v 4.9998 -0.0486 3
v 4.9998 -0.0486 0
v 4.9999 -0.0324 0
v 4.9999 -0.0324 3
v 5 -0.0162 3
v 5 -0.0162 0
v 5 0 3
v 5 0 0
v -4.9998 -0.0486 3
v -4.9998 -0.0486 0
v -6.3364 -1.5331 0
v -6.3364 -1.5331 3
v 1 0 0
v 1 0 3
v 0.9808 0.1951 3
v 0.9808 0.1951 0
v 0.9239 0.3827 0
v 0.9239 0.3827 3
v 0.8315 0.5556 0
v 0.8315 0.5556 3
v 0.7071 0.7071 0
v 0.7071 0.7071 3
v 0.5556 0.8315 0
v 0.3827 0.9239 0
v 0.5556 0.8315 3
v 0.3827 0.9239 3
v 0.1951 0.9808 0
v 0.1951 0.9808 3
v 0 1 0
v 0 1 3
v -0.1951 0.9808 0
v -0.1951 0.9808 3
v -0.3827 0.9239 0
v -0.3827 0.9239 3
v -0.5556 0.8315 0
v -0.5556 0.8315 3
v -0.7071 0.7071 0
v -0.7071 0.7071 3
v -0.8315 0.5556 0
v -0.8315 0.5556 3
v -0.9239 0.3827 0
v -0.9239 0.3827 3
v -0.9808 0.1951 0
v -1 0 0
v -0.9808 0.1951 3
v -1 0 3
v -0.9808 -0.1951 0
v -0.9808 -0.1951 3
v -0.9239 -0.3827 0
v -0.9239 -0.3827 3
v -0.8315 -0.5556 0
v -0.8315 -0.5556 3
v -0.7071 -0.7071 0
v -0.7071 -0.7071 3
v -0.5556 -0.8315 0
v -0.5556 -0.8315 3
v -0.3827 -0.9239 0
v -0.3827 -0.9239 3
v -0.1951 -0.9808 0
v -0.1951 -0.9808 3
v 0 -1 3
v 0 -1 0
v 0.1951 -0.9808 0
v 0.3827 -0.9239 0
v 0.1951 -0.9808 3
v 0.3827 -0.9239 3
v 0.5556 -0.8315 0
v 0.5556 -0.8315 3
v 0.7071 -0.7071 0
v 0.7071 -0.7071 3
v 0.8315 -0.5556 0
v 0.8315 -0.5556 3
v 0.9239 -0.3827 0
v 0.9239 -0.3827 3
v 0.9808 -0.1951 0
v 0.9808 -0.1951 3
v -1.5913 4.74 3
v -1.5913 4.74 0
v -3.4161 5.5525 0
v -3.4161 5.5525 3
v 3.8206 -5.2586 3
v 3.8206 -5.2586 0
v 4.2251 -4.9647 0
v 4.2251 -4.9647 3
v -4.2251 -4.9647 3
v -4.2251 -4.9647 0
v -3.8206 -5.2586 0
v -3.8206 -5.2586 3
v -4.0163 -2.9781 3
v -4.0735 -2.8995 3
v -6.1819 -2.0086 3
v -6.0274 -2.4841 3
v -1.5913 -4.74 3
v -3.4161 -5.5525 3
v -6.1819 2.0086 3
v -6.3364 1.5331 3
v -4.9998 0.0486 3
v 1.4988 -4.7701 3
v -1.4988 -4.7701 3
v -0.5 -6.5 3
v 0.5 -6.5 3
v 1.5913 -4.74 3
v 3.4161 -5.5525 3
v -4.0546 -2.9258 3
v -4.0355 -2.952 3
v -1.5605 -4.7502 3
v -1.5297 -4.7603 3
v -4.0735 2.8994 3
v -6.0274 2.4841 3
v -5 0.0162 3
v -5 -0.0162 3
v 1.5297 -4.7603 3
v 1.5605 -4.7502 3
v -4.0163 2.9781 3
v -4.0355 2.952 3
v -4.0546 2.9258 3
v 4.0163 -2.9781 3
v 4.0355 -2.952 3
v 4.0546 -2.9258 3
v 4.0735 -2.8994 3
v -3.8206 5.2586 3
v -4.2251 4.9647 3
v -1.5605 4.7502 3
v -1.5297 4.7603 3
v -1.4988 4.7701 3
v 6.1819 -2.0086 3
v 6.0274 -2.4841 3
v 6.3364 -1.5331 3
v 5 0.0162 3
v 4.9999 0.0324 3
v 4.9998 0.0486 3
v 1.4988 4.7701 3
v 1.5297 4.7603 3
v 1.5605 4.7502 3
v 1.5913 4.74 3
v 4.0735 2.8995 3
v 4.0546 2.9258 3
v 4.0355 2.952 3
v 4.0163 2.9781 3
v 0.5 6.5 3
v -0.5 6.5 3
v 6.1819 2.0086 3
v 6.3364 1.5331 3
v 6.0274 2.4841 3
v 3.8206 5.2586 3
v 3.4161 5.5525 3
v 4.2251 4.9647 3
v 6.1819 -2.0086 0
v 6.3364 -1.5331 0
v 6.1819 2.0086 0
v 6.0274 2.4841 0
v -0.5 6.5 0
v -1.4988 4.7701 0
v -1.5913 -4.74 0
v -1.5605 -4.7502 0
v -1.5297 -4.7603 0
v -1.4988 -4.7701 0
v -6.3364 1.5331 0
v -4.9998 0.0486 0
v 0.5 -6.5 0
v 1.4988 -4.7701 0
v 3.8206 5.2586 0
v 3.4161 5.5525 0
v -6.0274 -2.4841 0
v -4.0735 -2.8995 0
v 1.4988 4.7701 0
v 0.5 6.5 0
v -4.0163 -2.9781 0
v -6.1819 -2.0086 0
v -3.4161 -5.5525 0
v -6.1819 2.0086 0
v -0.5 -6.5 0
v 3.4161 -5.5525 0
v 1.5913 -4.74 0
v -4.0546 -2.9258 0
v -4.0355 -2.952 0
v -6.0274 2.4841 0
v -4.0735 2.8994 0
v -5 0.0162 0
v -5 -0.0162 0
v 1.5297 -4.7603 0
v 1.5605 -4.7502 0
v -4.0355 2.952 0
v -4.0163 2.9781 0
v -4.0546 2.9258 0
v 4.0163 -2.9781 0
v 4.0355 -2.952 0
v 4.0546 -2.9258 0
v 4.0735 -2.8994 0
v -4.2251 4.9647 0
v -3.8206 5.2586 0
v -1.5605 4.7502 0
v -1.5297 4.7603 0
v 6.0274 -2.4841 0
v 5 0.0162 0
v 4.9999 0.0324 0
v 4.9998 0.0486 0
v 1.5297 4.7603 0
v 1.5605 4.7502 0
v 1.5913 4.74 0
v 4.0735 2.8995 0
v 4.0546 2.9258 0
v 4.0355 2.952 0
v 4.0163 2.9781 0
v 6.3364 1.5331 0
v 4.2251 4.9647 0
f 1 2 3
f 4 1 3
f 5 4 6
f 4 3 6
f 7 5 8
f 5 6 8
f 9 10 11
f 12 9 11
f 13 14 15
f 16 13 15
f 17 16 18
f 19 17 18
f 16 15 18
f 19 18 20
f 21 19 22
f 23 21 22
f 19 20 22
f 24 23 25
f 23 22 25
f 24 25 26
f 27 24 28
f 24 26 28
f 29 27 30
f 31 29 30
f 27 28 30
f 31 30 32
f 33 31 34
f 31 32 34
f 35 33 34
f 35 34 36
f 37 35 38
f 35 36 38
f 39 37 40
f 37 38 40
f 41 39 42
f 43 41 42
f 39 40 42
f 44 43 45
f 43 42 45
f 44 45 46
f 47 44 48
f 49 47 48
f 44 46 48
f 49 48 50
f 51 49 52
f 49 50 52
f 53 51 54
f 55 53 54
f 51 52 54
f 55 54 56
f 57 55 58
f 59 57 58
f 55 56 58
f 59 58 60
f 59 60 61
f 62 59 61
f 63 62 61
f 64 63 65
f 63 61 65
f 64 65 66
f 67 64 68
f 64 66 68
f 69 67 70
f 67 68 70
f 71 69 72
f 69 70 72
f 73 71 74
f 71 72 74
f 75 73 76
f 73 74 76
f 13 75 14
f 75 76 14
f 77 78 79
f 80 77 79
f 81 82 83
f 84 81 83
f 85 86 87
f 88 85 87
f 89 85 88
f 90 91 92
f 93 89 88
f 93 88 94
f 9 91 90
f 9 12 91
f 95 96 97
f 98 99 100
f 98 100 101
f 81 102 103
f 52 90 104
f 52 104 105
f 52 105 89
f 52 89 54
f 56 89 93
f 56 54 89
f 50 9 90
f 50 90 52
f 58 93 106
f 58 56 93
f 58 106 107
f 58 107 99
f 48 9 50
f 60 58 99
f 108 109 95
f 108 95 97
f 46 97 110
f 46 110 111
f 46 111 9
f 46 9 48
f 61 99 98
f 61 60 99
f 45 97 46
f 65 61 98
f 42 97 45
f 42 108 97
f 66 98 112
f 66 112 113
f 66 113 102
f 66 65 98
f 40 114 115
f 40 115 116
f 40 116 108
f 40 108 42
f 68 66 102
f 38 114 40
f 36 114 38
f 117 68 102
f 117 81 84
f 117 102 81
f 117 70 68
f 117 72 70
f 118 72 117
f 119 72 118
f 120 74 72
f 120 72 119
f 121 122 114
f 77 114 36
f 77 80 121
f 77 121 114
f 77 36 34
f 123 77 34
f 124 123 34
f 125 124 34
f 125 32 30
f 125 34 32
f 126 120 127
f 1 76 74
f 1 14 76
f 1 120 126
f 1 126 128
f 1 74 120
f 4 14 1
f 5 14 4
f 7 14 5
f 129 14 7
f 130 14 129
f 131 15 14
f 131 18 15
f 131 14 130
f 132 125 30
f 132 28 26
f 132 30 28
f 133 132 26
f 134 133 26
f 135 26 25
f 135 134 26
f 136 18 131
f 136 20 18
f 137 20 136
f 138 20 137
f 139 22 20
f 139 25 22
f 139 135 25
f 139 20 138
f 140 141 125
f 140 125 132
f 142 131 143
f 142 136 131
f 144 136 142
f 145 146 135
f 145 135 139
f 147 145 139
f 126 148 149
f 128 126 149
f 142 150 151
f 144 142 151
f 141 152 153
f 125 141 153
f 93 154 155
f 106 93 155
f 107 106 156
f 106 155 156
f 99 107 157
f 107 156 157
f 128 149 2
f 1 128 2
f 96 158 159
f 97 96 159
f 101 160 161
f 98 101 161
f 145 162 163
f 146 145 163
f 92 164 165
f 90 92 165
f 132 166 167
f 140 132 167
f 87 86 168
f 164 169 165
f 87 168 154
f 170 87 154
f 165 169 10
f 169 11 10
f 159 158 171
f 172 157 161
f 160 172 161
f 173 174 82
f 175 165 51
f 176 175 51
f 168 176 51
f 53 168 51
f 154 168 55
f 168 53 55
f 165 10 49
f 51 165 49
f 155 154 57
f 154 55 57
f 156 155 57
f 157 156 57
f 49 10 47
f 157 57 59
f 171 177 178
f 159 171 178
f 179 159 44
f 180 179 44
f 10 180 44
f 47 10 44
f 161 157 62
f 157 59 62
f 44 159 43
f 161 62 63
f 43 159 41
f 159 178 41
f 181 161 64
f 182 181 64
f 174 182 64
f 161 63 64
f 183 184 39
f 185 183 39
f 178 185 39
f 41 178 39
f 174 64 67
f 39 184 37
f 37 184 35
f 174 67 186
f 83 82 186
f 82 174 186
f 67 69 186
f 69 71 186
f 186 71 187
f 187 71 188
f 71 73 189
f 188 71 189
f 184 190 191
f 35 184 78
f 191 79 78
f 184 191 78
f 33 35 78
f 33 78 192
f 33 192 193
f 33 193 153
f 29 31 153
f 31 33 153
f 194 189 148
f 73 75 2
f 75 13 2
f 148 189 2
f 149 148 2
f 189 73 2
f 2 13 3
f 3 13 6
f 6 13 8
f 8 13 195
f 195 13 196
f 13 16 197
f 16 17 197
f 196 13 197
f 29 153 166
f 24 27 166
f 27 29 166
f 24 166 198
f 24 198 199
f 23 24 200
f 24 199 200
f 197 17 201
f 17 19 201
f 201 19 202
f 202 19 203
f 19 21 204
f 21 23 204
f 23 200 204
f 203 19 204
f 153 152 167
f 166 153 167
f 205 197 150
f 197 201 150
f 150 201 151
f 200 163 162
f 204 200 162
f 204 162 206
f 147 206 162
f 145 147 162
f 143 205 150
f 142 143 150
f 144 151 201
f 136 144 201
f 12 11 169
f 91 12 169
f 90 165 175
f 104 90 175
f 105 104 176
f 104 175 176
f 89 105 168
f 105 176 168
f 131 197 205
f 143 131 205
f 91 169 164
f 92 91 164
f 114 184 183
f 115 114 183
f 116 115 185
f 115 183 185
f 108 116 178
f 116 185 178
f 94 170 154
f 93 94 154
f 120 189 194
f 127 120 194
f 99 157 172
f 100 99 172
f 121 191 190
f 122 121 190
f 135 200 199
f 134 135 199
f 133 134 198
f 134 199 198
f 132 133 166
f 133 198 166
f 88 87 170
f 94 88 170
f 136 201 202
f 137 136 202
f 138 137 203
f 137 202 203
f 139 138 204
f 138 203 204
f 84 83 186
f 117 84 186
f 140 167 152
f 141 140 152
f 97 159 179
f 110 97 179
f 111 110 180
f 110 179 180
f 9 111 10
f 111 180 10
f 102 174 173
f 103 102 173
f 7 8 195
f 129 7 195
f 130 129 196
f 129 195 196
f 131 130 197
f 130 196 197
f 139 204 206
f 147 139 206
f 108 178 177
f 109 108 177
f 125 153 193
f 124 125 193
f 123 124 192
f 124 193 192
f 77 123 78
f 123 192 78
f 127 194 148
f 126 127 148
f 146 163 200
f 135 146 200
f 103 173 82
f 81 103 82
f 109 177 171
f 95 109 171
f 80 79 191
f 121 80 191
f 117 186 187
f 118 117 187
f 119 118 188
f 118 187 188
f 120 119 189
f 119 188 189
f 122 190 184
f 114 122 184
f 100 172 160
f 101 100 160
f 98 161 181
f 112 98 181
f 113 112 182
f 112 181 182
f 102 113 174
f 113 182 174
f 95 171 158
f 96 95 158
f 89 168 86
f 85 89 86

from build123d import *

# Parameters (mm, degrees)
F1_DEPTH = 3
F2_R     = 1
F3_DEPTH = 3


with BuildPart() as f1:
    # F0 (on Top) → F1 (new body)
    with BuildSketch(Plane.XY):
        with BuildLine():
            ThreePointArc((4.999764, -0.048624), (4.999941, -0.024312), (5, 0))
            ThreePointArc((5, 0), (4.999941, 0.024312), (4.999764, 0.048624))
            ThreePointArc((4.999764, 0.048624), (4.755283, 1.545085), (4.073474, 2.89945))
            ThreePointArc((4.073474, 2.89945), (4.045085, 2.938926), (4.016313, 2.978125))
            ThreePointArc((4.016313, 2.978125), (2.938926, 4.045085), (1.591256, 4.740032))
            ThreePointArc((1.591256, 4.740032), (1.545085, 4.755283), (1.498768, 4.770083))
            ThreePointArc((1.498768, 4.770083), (0, 5), (-1.498768, 4.770083))
            ThreePointArc((-1.498768, 4.770083), (-1.545085, 4.755283), (-1.591256, 4.740032))
            ThreePointArc((-1.591256, 4.740032), (-2.938926, 4.045085), (-4.016313, 2.978125))
            ThreePointArc((-4.016313, 2.978125), (-4.045085, 2.938926), (-4.073474, 2.89945))
            ThreePointArc((-4.073474, 2.89945), (-4.755283, 1.545085), (-4.999764, 0.048624))
            ThreePointArc((-4.999764, 0.048624), (-5, 0), (-4.999764, -0.048624))
            ThreePointArc((-4.999764, -0.048624), (-4.755283, -1.545085), (-4.073474, -2.89945))
            ThreePointArc((-4.073474, -2.89945), (-4.045085, -2.938926), (-4.016313, -2.978125))
            ThreePointArc((-4.016313, -2.978125), (-2.938926, -4.045085), (-1.591256, -4.740032))
            ThreePointArc((-1.591256, -4.740032), (-1.545085, -4.755283), (-1.498768, -4.770083))
            ThreePointArc((-1.498768, -4.770083), (0, -5), (1.498768, -4.770083))
            ThreePointArc((1.498768, -4.770083), (1.545085, -4.755283), (1.591256, -4.740032))
            ThreePointArc((1.591256, -4.740032), (2.938926, -4.045085), (4.016313, -2.978125))
            ThreePointArc((4.016313, -2.978125), (4.045085, -2.938926), (4.073474, -2.89945))
            ThreePointArc((4.073474, -2.89945), (4.755283, -1.545085), (4.999764, -0.048624))
        make_face()
        with BuildLine():
            ThreePointArc((4.073474, 2.89945), (4.755283, 1.545085), (4.999764, 0.048624))
            Line((4.999764, 0.048624), (6.336376, 1.533082))
            Line((6.336376, 1.533082), (6.181867, 2.00861))
            Line((6.181867, 2.00861), (6.027359, 2.484139))
            Line((6.027359, 2.484139), (4.073474, 2.89945))
        make_face()
        with BuildLine():
            Line((6.336376, -1.533082), (4.999764, -0.048624))
            ThreePointArc((4.999764, -0.048624), (4.755283, -1.545085), (4.073474, -2.89945))
            Line((4.073474, -2.89945), (6.027359, -2.484139))
            Line((6.027359, -2.484139), (6.181867, -2.00861))
            Line((6.181867, -2.00861), (6.336376, -1.533082))
        make_face()
        with BuildLine():
            ThreePointArc((1.591256, 4.740032), (2.938926, 4.045085), (4.016313, 2.978125))
            Line((4.016313, 2.978125), (4.225113, 4.964718))
            Line((4.225113, 4.964718), (3.820604, 5.25861))
            Line((3.820604, 5.25861), (3.416096, 5.552503))
            Line((3.416096, 5.552503), (1.591256, 4.740032))
        make_face()
        with BuildLine():
            Line((4.225113, -4.964718), (4.016313, -2.978125))
            ThreePointArc((4.016313, -2.978125), (2.938926, -4.045085), (1.591256, -4.740032))
            Line((1.591256, -4.740032), (3.416096, -5.552503))
            Line((3.416096, -5.552503), (3.820604, -5.25861))
            Line((3.820604, -5.25861), (4.225113, -4.964718))
        make_face()
        with BuildLine():
            ThreePointArc((-1.498768, 4.770083), (0, 5), (1.498768, 4.770083))
            Line((1.498768, 4.770083), (0.5, 6.5))
            Line((0.5, 6.5), (0, 6.5))
            Line((0, 6.5), (-0.5, 6.5))
            Line((-0.5, 6.5), (-1.498768, 4.770083))
        make_face()
        with BuildLine():
            Line((0.5, -6.5), (1.498768, -4.770083))
            ThreePointArc((1.498768, -4.770083), (0, -5), (-1.498768, -4.770083))
            Line((-1.498768, -4.770083), (-0.5, -6.5))
            Line((-0.5, -6.5), (0, -6.5))
            Line((0, -6.5), (0.5, -6.5))
        make_face()
        with BuildLine():
            ThreePointArc((-4.016313, 2.978125), (-2.938926, 4.045085), (-1.591256, 4.740032))
            Line((-1.591256, 4.740032), (-3.416096, 5.552503))
            Line((-3.416096, 5.552503), (-3.820604, 5.25861))
            Line((-3.820604, 5.25861), (-4.225113, 4.964718))
            Line((-4.225113, 4.964718), (-4.016313, 2.978125))
        make_face()
        with BuildLine():
            Line((-3.416096, -5.552503), (-1.591256, -4.740032))
            ThreePointArc((-1.591256, -4.740032), (-2.938926, -4.045085), (-4.016313, -2.978125))
            Line((-4.016313, -2.978125), (-4.225113, -4.964718))
            Line((-4.225113, -4.964718), (-3.820604, -5.25861))
            Line((-3.820604, -5.25861), (-3.416096, -5.552503))
        make_face()
        with BuildLine():
            ThreePointArc((-4.999764, 0.048624), (-4.755283, 1.545085), (-4.073474, 2.89945))
            Line((-4.073474, 2.89945), (-6.027359, 2.484139))
            Line((-6.027359, 2.484139), (-6.181867, 2.00861))
            Line((-6.181867, 2.00861), (-6.336376, 1.533082))
            Line((-6.336376, 1.533082), (-4.999764, 0.048624))
        make_face()
        with BuildLine():
            Line((-6.027359, -2.484139), (-4.073474, -2.89945))
            ThreePointArc((-4.073474, -2.89945), (-4.755283, -1.545085), (-4.999764, -0.048624))
            Line((-4.999764, -0.048624), (-6.336376, -1.533082))
            Line((-6.336376, -1.533082), (-6.181867, -2.00861))
            Line((-6.181867, -2.00861), (-6.027359, -2.484139))
        make_face()
    extrude(amount=F1_DEPTH)

    # F2 (on face) → F3 (cut, through all)
    with BuildSketch(Plane.XY.offset(3)):
        Circle(F2_R)
    extrude(amount=-F3_DEPTH, mode=Mode.SUBTRACT)


solid = f1.part
